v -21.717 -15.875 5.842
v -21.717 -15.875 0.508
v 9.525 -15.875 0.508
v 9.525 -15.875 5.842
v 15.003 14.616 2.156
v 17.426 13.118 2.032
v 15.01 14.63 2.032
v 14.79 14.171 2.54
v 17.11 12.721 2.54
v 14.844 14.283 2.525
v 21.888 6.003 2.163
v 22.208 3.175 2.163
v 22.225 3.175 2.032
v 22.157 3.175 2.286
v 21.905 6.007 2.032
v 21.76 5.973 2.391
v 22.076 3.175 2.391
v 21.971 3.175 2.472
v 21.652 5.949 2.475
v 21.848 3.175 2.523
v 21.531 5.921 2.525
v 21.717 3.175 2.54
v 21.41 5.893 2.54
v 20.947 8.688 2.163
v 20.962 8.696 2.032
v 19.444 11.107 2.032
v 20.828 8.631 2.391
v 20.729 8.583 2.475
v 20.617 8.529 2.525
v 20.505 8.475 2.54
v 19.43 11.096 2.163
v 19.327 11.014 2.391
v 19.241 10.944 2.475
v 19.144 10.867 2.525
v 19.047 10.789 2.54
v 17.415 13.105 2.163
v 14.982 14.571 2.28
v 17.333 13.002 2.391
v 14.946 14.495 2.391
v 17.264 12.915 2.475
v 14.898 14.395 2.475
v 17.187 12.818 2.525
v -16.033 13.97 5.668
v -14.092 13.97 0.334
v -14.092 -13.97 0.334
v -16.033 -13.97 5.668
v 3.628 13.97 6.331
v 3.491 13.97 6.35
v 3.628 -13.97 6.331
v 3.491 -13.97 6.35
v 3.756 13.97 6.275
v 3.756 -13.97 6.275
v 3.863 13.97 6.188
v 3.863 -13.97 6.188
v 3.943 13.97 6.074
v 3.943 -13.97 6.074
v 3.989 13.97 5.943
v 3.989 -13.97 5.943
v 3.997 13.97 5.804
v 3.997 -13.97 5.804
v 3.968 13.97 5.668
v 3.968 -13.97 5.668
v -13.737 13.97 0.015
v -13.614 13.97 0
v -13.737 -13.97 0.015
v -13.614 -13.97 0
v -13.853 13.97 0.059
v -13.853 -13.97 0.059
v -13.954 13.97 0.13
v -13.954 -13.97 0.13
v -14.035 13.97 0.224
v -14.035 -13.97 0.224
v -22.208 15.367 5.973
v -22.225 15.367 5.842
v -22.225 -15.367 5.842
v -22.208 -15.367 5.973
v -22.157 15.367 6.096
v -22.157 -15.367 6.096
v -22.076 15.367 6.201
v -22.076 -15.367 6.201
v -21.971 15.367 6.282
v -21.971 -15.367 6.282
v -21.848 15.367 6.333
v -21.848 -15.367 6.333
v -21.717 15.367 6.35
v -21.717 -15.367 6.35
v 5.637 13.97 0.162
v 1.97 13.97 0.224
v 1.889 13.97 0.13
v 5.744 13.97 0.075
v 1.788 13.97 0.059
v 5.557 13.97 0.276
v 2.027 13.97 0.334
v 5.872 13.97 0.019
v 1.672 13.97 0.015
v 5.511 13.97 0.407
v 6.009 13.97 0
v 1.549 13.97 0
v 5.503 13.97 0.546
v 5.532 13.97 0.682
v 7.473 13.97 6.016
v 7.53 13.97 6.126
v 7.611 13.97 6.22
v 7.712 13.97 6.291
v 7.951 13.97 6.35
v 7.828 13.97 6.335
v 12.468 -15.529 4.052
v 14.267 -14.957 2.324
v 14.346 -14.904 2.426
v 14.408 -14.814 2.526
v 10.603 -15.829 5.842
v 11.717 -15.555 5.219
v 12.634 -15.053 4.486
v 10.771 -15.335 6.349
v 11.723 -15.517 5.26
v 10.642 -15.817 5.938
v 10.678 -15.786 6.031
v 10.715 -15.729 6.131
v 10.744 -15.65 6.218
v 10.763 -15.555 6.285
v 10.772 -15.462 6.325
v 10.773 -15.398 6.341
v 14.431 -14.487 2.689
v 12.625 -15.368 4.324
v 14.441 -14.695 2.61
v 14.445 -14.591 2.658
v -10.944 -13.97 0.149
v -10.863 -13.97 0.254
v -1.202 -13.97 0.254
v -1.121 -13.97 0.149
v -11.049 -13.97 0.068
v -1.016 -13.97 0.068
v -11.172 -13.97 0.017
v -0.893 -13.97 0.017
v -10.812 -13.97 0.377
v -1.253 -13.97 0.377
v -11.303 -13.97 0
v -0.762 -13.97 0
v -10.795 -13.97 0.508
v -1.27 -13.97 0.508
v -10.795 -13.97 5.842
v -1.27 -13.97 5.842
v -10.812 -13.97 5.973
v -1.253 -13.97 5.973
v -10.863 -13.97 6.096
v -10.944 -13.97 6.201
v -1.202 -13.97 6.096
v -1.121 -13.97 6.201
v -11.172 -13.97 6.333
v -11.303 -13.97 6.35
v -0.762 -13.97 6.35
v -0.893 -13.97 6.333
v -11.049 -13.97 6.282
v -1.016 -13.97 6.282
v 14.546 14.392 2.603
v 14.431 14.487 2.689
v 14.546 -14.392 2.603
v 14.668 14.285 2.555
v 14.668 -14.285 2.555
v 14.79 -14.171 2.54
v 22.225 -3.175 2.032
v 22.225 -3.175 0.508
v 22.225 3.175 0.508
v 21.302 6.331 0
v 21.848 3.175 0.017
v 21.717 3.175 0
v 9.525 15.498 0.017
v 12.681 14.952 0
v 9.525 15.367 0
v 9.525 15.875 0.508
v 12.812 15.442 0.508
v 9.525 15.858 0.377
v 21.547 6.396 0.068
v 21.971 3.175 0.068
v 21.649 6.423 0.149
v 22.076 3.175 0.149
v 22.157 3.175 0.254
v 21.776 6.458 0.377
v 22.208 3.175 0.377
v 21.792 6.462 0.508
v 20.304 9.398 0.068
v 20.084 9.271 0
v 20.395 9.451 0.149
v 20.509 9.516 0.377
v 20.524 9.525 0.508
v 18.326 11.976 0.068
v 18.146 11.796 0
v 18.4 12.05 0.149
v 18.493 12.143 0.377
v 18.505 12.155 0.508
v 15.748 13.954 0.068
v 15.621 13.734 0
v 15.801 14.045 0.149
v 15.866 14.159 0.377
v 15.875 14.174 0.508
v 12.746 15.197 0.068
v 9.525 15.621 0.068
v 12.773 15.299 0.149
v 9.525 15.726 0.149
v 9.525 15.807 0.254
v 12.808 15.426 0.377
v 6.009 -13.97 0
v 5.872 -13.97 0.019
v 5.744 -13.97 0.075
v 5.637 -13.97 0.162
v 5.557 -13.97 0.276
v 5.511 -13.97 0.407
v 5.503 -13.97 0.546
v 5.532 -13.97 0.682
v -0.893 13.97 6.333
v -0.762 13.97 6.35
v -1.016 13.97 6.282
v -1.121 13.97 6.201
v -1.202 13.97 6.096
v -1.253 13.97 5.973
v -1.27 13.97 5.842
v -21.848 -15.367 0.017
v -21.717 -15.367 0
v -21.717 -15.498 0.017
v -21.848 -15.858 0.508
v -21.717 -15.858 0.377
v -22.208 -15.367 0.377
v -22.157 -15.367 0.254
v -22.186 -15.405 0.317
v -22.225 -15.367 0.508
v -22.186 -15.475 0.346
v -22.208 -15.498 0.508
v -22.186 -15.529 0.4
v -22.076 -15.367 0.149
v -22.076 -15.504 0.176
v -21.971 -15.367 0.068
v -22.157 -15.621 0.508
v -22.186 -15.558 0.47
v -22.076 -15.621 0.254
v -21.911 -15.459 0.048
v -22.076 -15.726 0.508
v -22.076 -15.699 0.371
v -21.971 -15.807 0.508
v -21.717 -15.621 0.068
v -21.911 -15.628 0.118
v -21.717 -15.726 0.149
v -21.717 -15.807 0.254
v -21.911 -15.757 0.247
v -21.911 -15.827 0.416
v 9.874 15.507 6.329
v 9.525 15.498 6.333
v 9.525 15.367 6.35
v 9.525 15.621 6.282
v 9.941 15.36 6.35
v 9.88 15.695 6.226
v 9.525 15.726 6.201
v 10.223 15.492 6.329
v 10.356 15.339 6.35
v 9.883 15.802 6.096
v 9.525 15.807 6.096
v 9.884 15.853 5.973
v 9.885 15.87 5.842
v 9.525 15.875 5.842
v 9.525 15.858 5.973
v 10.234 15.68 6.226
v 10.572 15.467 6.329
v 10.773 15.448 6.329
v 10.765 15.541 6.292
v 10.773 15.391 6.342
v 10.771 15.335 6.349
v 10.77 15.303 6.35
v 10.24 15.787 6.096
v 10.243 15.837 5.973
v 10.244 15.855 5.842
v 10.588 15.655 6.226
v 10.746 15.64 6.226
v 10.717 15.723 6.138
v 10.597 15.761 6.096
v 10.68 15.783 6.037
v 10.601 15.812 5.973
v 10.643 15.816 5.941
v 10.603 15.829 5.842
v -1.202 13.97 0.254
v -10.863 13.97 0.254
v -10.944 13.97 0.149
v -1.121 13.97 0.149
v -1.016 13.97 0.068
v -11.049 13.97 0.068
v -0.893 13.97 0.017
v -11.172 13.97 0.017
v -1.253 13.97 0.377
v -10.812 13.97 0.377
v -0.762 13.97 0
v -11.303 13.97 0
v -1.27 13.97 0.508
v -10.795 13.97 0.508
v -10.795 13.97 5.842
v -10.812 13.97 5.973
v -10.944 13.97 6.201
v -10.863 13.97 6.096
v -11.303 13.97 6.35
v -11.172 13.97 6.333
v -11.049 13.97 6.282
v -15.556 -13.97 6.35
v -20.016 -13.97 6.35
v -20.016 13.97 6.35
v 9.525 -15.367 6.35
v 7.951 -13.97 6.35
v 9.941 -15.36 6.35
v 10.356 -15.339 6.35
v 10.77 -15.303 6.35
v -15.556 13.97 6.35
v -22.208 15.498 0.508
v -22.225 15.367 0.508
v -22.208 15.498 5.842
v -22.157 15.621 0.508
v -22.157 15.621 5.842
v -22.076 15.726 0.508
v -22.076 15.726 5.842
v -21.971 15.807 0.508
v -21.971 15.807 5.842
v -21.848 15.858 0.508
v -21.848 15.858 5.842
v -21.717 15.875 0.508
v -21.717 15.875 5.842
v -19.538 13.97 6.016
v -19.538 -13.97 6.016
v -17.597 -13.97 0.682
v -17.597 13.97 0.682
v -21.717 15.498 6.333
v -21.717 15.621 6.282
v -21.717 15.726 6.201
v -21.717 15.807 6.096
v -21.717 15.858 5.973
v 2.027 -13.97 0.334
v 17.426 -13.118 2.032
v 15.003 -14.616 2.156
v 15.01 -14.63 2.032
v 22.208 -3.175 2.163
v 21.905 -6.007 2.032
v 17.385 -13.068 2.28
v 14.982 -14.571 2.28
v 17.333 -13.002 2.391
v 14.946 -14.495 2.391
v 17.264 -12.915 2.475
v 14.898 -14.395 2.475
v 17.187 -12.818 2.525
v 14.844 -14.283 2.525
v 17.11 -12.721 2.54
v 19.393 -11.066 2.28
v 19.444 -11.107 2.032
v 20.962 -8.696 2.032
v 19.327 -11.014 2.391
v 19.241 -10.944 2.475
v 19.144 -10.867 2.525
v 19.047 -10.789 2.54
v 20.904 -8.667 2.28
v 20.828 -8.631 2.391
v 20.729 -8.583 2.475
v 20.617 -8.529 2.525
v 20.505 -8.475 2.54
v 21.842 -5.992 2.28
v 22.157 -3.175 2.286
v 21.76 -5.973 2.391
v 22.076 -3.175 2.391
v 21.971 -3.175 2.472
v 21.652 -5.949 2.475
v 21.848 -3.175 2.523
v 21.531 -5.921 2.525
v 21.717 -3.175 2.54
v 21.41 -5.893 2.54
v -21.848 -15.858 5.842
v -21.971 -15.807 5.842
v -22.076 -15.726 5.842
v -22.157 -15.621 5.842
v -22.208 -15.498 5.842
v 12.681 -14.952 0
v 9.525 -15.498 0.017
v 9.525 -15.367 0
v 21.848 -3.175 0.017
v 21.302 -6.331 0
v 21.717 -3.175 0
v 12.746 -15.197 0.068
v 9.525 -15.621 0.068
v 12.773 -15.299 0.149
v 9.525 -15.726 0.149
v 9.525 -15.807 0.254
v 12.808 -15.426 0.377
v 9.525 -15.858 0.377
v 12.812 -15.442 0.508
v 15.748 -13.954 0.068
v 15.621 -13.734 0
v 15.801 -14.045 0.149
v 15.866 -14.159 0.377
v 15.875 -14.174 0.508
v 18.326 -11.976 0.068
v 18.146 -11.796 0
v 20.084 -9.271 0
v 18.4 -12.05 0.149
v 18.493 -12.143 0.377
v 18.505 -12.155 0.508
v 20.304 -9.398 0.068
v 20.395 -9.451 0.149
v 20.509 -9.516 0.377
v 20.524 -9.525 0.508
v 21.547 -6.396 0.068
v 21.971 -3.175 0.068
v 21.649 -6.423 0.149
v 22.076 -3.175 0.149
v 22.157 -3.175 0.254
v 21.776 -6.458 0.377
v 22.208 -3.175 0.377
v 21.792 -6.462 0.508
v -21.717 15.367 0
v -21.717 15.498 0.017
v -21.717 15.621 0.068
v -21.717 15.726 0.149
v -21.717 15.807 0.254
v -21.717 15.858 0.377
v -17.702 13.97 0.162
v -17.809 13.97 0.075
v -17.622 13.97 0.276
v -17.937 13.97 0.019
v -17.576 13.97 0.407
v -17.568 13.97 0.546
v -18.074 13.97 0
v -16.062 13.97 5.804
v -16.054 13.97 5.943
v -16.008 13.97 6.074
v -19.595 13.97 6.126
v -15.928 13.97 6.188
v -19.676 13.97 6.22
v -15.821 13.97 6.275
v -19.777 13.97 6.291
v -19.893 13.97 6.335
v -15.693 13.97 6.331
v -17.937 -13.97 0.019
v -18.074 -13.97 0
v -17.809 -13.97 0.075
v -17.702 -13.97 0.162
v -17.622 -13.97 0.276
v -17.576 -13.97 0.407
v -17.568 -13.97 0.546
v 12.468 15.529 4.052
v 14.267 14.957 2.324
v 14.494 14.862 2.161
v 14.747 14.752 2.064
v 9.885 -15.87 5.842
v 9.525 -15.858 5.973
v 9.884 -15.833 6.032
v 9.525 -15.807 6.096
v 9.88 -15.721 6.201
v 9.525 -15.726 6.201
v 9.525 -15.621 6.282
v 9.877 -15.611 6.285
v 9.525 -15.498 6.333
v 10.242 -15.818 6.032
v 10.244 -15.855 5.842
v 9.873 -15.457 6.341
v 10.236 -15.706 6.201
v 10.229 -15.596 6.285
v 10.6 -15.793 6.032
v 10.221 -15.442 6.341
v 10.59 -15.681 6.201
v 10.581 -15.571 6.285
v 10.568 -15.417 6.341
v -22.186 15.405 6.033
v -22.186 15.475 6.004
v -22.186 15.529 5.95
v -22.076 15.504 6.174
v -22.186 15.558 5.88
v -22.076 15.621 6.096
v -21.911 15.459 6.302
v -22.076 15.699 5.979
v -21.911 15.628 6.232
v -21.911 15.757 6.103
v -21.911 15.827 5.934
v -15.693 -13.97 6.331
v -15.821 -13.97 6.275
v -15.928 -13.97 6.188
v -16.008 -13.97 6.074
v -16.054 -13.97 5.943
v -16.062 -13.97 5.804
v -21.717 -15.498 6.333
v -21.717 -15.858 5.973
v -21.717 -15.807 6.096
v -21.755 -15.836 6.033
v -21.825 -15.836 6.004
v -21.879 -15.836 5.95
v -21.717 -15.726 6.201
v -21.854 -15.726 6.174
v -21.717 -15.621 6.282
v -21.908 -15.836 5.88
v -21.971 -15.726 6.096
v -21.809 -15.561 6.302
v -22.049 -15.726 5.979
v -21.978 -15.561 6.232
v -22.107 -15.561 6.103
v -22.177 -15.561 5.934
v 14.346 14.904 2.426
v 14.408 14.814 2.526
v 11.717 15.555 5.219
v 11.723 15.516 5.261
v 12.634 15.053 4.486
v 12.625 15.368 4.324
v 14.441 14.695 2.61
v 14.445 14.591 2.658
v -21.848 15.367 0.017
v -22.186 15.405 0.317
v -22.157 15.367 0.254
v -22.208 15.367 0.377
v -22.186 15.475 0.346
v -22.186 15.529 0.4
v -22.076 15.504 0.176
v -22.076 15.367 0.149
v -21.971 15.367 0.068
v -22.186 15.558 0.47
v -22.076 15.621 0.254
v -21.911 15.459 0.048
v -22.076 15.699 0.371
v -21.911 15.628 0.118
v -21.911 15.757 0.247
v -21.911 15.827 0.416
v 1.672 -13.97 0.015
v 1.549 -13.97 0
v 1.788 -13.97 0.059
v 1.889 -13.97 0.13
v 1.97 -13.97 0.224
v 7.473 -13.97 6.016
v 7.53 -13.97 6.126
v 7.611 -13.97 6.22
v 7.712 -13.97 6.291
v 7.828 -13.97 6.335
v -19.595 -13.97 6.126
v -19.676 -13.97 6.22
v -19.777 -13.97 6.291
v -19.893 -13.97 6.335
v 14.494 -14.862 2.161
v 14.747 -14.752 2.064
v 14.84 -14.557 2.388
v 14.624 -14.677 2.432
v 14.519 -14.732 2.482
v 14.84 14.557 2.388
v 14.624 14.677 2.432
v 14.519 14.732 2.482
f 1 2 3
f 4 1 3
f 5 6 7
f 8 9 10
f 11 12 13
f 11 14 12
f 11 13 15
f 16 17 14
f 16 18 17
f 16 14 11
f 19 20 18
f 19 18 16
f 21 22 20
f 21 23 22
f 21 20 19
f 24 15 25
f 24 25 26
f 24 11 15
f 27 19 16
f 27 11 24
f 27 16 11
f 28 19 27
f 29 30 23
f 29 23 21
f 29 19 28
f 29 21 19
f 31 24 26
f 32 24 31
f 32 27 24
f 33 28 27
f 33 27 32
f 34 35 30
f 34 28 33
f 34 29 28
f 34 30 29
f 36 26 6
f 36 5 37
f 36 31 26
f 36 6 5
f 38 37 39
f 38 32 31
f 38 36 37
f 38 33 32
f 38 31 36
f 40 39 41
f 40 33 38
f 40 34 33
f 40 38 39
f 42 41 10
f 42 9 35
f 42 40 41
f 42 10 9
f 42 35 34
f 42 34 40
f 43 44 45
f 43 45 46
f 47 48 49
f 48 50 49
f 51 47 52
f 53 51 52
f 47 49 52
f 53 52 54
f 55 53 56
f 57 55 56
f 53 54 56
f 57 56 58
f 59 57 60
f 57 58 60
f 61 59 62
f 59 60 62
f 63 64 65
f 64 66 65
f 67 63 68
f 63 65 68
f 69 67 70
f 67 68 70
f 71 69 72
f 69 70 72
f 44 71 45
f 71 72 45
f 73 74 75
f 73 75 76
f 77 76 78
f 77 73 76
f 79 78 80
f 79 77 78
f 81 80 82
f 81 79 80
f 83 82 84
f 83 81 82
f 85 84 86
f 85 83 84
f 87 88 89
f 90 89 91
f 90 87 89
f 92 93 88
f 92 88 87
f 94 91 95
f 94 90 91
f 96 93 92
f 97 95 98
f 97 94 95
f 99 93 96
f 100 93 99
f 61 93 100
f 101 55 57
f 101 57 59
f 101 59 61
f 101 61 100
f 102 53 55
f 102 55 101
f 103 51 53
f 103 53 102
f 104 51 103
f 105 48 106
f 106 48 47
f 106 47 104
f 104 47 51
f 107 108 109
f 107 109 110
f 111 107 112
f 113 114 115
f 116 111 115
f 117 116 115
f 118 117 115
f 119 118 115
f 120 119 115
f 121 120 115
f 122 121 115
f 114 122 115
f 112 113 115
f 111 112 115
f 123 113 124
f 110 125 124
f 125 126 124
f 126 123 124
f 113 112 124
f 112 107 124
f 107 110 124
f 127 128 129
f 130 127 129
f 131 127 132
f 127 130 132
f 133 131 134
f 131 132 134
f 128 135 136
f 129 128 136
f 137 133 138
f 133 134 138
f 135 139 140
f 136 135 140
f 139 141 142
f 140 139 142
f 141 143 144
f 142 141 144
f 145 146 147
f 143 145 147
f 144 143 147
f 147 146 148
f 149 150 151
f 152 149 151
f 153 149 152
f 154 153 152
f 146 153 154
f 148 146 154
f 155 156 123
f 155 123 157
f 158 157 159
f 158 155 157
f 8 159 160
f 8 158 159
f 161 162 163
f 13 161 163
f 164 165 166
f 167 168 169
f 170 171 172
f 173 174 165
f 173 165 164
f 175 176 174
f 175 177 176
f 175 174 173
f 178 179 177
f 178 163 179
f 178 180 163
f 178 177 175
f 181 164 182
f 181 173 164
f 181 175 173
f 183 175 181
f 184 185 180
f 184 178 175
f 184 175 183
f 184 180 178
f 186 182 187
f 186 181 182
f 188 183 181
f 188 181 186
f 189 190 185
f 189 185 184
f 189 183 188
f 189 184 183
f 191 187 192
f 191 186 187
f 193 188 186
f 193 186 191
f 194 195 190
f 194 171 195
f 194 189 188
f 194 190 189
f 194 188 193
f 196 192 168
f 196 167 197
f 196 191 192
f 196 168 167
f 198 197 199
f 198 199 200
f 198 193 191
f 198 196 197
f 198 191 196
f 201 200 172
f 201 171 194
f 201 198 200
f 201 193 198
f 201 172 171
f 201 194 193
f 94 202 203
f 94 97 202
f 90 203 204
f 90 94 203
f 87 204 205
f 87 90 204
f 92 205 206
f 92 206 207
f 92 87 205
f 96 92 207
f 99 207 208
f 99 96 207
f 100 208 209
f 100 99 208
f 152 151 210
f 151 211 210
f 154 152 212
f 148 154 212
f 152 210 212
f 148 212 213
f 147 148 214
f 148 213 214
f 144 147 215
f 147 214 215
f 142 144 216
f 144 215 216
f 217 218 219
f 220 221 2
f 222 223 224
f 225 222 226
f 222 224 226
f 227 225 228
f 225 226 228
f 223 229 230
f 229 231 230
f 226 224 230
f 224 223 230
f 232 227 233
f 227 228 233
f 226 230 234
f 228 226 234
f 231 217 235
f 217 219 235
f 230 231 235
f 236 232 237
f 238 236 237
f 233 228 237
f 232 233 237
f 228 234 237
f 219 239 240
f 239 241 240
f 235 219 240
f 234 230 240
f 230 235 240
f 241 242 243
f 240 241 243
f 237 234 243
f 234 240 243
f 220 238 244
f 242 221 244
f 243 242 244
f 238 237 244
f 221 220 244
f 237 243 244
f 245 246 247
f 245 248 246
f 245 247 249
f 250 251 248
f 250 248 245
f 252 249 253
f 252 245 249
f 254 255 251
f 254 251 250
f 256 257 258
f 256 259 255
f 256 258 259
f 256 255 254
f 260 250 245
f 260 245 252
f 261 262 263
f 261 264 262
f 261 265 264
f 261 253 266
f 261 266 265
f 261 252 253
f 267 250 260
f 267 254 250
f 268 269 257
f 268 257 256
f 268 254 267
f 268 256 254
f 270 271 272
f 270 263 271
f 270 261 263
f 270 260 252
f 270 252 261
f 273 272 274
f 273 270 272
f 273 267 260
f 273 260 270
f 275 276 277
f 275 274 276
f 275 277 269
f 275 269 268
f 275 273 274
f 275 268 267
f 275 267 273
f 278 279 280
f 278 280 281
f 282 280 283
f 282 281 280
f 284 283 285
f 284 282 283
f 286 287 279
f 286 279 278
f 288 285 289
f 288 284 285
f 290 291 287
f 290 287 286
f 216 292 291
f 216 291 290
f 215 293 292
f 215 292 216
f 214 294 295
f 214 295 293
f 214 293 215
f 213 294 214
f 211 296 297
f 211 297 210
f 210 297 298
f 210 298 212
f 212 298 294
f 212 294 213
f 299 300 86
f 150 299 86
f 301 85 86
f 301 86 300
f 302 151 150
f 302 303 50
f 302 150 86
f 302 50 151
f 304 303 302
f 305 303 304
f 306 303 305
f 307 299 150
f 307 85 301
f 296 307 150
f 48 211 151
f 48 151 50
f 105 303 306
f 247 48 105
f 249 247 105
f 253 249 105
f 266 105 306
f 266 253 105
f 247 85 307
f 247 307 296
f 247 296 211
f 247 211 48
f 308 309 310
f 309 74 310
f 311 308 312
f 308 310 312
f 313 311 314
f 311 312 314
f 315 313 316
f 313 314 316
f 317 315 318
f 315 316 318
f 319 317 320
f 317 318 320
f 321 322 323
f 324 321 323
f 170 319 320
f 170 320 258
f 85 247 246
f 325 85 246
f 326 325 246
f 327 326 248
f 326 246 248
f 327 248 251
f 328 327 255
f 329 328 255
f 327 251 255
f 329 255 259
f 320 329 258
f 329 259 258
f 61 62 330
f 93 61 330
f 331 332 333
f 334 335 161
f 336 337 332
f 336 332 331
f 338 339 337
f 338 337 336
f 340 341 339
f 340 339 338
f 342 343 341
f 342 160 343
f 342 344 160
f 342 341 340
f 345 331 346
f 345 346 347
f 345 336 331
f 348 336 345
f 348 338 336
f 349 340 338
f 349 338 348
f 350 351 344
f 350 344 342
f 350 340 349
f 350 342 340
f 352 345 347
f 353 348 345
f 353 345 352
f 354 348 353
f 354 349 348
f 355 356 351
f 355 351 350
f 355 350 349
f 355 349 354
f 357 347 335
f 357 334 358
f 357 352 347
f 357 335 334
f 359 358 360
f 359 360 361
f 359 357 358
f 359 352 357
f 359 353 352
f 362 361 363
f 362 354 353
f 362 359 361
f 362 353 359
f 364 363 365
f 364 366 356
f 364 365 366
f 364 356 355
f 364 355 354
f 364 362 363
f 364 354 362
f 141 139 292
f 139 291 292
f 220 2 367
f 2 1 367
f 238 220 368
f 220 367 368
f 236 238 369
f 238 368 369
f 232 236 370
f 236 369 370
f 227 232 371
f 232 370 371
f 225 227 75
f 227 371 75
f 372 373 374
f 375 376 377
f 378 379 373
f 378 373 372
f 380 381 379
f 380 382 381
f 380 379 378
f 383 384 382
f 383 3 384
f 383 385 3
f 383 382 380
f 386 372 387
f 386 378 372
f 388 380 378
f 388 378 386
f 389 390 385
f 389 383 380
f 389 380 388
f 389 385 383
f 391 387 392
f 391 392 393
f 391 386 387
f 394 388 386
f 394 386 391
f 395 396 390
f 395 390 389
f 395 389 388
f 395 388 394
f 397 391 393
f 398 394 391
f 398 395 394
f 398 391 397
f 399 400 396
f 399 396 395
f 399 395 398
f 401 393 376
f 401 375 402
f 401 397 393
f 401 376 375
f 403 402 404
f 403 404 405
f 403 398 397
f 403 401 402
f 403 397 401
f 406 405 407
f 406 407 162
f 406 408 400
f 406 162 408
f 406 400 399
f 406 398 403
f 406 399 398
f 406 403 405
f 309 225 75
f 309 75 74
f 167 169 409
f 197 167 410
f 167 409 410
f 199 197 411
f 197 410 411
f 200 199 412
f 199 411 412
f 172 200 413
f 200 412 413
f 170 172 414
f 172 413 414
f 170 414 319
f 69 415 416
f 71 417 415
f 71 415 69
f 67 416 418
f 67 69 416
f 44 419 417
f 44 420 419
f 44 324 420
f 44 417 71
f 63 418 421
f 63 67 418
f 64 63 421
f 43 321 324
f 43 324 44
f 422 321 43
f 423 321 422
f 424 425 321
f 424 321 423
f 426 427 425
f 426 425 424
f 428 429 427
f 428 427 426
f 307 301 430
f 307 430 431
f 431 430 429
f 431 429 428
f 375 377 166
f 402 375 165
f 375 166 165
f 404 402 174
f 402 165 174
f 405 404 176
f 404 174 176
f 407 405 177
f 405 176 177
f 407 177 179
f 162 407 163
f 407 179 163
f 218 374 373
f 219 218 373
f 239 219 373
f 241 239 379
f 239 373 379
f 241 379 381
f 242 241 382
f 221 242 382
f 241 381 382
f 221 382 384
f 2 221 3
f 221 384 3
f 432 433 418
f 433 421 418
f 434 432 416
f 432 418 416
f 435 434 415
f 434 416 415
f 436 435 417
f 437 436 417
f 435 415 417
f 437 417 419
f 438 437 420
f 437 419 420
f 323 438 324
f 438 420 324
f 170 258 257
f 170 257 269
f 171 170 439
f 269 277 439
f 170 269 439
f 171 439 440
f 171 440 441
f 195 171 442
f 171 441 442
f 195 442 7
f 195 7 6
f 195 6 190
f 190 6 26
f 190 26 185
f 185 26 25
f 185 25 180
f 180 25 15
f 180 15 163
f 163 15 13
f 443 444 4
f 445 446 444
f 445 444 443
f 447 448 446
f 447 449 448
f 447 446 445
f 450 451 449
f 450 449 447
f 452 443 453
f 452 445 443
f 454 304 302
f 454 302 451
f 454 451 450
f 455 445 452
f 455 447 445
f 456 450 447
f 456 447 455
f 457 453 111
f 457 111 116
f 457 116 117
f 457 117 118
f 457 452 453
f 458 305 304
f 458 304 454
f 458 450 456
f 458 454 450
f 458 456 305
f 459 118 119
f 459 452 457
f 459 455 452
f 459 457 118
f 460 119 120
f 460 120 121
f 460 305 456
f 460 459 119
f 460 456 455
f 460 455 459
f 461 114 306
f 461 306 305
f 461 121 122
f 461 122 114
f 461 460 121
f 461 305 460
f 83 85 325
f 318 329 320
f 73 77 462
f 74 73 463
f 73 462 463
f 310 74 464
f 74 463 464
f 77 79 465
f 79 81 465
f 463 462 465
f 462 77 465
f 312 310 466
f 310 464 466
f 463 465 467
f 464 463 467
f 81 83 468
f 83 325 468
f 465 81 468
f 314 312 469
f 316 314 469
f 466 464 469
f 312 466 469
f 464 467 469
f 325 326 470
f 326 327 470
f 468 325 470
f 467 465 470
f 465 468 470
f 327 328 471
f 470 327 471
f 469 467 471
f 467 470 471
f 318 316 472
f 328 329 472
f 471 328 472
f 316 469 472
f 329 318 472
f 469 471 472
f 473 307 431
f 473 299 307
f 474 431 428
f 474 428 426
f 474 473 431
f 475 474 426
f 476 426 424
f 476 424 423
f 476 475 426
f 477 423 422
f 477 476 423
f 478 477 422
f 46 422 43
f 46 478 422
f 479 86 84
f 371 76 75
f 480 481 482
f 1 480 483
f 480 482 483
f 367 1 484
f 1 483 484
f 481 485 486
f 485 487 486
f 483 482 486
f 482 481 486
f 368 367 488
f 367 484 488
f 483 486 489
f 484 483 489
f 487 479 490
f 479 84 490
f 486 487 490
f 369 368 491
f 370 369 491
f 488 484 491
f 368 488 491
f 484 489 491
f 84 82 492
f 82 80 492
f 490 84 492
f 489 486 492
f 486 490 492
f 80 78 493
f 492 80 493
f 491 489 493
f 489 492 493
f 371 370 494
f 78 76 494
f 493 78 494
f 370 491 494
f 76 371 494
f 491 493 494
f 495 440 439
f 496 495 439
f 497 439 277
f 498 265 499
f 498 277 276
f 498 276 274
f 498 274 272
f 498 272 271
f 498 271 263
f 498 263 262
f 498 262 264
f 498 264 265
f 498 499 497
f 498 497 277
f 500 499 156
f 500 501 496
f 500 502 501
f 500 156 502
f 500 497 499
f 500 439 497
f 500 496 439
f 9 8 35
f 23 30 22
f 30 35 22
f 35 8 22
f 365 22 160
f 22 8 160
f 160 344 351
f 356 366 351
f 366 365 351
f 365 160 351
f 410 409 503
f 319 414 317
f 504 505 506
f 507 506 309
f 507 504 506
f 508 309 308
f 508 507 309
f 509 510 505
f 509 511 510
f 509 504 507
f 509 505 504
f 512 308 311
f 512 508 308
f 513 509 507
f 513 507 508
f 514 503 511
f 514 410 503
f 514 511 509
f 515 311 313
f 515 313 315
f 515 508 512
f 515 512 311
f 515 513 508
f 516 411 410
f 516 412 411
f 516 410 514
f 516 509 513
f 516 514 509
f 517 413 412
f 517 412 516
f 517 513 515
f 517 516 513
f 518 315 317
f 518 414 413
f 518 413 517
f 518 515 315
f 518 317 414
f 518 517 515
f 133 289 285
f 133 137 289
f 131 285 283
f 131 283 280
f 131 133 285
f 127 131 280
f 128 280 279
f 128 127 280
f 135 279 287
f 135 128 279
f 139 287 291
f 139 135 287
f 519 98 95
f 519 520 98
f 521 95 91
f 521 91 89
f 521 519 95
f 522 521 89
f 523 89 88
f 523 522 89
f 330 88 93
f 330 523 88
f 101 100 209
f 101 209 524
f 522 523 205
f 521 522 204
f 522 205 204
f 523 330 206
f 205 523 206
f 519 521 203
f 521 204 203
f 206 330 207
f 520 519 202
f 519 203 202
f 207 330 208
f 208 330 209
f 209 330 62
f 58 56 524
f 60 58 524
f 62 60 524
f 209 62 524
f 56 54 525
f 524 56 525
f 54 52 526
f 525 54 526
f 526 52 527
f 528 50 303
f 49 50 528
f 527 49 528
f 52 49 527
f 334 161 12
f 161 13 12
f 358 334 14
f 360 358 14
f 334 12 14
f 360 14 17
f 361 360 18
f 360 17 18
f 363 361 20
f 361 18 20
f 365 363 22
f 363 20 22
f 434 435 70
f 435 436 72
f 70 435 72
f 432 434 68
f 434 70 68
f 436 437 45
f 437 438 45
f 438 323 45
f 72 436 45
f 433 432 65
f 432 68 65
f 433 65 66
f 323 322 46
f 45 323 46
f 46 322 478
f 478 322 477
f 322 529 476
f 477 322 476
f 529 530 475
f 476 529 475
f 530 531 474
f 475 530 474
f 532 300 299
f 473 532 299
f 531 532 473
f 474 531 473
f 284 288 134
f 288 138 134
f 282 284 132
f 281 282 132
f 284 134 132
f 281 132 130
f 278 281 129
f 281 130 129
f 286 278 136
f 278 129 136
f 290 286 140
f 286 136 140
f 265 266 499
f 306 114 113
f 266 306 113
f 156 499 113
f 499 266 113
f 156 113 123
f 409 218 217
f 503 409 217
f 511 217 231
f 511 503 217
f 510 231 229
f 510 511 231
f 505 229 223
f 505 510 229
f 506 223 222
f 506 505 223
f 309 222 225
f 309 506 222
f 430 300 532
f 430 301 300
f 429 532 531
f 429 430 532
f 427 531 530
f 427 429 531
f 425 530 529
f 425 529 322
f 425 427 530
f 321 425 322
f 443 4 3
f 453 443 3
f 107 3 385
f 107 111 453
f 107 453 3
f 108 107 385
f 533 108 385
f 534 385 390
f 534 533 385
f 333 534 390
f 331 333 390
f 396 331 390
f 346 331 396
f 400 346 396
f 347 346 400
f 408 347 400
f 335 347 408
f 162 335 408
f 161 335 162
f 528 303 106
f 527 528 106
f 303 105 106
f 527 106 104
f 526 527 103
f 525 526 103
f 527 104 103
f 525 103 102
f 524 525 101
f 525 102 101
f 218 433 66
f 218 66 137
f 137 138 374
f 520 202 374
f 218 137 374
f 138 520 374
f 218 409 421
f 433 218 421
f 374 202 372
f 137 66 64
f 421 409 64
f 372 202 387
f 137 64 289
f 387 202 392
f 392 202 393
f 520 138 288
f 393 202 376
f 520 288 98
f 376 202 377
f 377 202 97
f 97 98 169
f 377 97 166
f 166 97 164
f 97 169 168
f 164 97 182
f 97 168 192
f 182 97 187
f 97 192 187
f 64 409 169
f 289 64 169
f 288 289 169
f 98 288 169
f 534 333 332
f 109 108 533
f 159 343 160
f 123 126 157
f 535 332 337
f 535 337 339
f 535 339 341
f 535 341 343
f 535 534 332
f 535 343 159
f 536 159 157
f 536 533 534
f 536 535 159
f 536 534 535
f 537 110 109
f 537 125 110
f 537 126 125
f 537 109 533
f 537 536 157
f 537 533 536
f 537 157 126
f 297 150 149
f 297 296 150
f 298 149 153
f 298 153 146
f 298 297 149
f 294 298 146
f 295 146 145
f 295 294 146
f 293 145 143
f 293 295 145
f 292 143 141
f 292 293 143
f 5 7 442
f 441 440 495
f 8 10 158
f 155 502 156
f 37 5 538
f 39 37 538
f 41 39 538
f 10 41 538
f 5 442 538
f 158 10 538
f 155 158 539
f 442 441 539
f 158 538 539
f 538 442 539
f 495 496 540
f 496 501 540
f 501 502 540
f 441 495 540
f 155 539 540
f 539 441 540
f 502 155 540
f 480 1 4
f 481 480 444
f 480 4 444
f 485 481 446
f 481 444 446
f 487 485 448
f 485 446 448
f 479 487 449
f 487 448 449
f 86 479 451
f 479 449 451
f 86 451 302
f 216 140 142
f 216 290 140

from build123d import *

# Parameters (mm, degrees)
F0_W     = 44.45
F0_H     = 31.75
F1_DEPTH = 6.35
F2_W     = 9.525
F2_H     = 6.35
F3_DEPTH = 13.97
F5_DEPTH = 31.751
F6_R     = 12.7
F7_R     = 0.508


with BuildPart() as f1:
    # F0 (on Top) → F1 (new body)
    with BuildSketch(Plane.XY):
        Rectangle(F0_W, F0_H)
    extrude(amount=F1_DEPTH)

    # F2 (on Front) → F3 (cut, symmetric)
    with BuildSketch(Plane.XZ):
        with Locations((-6.0325, 3.175)):
            Rectangle(F2_W, F2_H)
        Polygon((-17.1641401403, 8.7758279101), (-20.1476642113, 7.6899139551), (-16.8610756315, -1.3399139551), (-13.8775515605, -0.254), align=None)
        Polygon((1.8125515605, -0.254), (4.7960756315, -1.3399139551), (8.0826642113, 7.6899139551), (5.0991401403, 8.7758279101), align=None)
    extrude(amount=F3_DEPTH, both=True, mode=Mode.SUBTRACT)

    # F4 (on face) → F5 (cut, through all)
    with BuildSketch(Plane.XZ.offset(15.875)):
        Polygon((22.225, 6.35), (10.7699754152, 6.35), (14.5799754152, 2.54), (22.225, 2.54), align=None)
    extrude(amount=-F5_DEPTH, mode=Mode.SUBTRACT)

    # F6
    f6_edges = [f1.edges().sort_by_distance(p)[0] for p in [
        (22.225, -15.875, 1.27),
        (22.225, 15.875, 1.27),
    ]]
    fillet(f6_edges, radius=F6_R)

    # F7
    f7_edges = [f1.edges().sort_by_distance(p)[0] for p in [
        (-16.281211, 0, 6.35),
        (-19.659975, 0, 6.35),
        (-17.348764, 0, 0),
        (-10.795, 0, 6.35),
        (-1.27, 0, 6.35),
        (4.216211, 0, 6.35),
        (-13.97, 0, 0),
        (-10.795, 0, 0),
        (-1.27, 0, 0),
        (1.905, 0, 0),
        (5.283764, 0, 0),
        (7.594975, 0, 6.35),
        (14.579975, 0, 2.54),
        (20.143102, -10.142489, 2.54),
        (18.505256, -12.155256, 0),
        (-22.225, 0, 0),
        (-6.35, 15.875, 6.35),
        (-22.225, 0, 6.35),
        (-6.35, -15.875, 6.35),
        (-22.225, -15.875, 3.175),
        (-22.225, 15.875, 3.175),
        (-6.35, 15.875, 0),
        (18.505256, 12.155256, 0),
        (22.225, 0, 0),
        (-6.35, -15.875, 0),
        (10.148239, 15.859698, 6.35),
        (12.713492, 15.468231, 4.406484),
        (20.143102, 10.142489, 2.54),
        (10.148239, -15.859698, 6.35),
        (22.225, 0, 2.54),
        (12.713492, -15.468231, 4.406484),
    ]]
    fillet(f7_edges, radius=F7_R)


solid = f1.part
